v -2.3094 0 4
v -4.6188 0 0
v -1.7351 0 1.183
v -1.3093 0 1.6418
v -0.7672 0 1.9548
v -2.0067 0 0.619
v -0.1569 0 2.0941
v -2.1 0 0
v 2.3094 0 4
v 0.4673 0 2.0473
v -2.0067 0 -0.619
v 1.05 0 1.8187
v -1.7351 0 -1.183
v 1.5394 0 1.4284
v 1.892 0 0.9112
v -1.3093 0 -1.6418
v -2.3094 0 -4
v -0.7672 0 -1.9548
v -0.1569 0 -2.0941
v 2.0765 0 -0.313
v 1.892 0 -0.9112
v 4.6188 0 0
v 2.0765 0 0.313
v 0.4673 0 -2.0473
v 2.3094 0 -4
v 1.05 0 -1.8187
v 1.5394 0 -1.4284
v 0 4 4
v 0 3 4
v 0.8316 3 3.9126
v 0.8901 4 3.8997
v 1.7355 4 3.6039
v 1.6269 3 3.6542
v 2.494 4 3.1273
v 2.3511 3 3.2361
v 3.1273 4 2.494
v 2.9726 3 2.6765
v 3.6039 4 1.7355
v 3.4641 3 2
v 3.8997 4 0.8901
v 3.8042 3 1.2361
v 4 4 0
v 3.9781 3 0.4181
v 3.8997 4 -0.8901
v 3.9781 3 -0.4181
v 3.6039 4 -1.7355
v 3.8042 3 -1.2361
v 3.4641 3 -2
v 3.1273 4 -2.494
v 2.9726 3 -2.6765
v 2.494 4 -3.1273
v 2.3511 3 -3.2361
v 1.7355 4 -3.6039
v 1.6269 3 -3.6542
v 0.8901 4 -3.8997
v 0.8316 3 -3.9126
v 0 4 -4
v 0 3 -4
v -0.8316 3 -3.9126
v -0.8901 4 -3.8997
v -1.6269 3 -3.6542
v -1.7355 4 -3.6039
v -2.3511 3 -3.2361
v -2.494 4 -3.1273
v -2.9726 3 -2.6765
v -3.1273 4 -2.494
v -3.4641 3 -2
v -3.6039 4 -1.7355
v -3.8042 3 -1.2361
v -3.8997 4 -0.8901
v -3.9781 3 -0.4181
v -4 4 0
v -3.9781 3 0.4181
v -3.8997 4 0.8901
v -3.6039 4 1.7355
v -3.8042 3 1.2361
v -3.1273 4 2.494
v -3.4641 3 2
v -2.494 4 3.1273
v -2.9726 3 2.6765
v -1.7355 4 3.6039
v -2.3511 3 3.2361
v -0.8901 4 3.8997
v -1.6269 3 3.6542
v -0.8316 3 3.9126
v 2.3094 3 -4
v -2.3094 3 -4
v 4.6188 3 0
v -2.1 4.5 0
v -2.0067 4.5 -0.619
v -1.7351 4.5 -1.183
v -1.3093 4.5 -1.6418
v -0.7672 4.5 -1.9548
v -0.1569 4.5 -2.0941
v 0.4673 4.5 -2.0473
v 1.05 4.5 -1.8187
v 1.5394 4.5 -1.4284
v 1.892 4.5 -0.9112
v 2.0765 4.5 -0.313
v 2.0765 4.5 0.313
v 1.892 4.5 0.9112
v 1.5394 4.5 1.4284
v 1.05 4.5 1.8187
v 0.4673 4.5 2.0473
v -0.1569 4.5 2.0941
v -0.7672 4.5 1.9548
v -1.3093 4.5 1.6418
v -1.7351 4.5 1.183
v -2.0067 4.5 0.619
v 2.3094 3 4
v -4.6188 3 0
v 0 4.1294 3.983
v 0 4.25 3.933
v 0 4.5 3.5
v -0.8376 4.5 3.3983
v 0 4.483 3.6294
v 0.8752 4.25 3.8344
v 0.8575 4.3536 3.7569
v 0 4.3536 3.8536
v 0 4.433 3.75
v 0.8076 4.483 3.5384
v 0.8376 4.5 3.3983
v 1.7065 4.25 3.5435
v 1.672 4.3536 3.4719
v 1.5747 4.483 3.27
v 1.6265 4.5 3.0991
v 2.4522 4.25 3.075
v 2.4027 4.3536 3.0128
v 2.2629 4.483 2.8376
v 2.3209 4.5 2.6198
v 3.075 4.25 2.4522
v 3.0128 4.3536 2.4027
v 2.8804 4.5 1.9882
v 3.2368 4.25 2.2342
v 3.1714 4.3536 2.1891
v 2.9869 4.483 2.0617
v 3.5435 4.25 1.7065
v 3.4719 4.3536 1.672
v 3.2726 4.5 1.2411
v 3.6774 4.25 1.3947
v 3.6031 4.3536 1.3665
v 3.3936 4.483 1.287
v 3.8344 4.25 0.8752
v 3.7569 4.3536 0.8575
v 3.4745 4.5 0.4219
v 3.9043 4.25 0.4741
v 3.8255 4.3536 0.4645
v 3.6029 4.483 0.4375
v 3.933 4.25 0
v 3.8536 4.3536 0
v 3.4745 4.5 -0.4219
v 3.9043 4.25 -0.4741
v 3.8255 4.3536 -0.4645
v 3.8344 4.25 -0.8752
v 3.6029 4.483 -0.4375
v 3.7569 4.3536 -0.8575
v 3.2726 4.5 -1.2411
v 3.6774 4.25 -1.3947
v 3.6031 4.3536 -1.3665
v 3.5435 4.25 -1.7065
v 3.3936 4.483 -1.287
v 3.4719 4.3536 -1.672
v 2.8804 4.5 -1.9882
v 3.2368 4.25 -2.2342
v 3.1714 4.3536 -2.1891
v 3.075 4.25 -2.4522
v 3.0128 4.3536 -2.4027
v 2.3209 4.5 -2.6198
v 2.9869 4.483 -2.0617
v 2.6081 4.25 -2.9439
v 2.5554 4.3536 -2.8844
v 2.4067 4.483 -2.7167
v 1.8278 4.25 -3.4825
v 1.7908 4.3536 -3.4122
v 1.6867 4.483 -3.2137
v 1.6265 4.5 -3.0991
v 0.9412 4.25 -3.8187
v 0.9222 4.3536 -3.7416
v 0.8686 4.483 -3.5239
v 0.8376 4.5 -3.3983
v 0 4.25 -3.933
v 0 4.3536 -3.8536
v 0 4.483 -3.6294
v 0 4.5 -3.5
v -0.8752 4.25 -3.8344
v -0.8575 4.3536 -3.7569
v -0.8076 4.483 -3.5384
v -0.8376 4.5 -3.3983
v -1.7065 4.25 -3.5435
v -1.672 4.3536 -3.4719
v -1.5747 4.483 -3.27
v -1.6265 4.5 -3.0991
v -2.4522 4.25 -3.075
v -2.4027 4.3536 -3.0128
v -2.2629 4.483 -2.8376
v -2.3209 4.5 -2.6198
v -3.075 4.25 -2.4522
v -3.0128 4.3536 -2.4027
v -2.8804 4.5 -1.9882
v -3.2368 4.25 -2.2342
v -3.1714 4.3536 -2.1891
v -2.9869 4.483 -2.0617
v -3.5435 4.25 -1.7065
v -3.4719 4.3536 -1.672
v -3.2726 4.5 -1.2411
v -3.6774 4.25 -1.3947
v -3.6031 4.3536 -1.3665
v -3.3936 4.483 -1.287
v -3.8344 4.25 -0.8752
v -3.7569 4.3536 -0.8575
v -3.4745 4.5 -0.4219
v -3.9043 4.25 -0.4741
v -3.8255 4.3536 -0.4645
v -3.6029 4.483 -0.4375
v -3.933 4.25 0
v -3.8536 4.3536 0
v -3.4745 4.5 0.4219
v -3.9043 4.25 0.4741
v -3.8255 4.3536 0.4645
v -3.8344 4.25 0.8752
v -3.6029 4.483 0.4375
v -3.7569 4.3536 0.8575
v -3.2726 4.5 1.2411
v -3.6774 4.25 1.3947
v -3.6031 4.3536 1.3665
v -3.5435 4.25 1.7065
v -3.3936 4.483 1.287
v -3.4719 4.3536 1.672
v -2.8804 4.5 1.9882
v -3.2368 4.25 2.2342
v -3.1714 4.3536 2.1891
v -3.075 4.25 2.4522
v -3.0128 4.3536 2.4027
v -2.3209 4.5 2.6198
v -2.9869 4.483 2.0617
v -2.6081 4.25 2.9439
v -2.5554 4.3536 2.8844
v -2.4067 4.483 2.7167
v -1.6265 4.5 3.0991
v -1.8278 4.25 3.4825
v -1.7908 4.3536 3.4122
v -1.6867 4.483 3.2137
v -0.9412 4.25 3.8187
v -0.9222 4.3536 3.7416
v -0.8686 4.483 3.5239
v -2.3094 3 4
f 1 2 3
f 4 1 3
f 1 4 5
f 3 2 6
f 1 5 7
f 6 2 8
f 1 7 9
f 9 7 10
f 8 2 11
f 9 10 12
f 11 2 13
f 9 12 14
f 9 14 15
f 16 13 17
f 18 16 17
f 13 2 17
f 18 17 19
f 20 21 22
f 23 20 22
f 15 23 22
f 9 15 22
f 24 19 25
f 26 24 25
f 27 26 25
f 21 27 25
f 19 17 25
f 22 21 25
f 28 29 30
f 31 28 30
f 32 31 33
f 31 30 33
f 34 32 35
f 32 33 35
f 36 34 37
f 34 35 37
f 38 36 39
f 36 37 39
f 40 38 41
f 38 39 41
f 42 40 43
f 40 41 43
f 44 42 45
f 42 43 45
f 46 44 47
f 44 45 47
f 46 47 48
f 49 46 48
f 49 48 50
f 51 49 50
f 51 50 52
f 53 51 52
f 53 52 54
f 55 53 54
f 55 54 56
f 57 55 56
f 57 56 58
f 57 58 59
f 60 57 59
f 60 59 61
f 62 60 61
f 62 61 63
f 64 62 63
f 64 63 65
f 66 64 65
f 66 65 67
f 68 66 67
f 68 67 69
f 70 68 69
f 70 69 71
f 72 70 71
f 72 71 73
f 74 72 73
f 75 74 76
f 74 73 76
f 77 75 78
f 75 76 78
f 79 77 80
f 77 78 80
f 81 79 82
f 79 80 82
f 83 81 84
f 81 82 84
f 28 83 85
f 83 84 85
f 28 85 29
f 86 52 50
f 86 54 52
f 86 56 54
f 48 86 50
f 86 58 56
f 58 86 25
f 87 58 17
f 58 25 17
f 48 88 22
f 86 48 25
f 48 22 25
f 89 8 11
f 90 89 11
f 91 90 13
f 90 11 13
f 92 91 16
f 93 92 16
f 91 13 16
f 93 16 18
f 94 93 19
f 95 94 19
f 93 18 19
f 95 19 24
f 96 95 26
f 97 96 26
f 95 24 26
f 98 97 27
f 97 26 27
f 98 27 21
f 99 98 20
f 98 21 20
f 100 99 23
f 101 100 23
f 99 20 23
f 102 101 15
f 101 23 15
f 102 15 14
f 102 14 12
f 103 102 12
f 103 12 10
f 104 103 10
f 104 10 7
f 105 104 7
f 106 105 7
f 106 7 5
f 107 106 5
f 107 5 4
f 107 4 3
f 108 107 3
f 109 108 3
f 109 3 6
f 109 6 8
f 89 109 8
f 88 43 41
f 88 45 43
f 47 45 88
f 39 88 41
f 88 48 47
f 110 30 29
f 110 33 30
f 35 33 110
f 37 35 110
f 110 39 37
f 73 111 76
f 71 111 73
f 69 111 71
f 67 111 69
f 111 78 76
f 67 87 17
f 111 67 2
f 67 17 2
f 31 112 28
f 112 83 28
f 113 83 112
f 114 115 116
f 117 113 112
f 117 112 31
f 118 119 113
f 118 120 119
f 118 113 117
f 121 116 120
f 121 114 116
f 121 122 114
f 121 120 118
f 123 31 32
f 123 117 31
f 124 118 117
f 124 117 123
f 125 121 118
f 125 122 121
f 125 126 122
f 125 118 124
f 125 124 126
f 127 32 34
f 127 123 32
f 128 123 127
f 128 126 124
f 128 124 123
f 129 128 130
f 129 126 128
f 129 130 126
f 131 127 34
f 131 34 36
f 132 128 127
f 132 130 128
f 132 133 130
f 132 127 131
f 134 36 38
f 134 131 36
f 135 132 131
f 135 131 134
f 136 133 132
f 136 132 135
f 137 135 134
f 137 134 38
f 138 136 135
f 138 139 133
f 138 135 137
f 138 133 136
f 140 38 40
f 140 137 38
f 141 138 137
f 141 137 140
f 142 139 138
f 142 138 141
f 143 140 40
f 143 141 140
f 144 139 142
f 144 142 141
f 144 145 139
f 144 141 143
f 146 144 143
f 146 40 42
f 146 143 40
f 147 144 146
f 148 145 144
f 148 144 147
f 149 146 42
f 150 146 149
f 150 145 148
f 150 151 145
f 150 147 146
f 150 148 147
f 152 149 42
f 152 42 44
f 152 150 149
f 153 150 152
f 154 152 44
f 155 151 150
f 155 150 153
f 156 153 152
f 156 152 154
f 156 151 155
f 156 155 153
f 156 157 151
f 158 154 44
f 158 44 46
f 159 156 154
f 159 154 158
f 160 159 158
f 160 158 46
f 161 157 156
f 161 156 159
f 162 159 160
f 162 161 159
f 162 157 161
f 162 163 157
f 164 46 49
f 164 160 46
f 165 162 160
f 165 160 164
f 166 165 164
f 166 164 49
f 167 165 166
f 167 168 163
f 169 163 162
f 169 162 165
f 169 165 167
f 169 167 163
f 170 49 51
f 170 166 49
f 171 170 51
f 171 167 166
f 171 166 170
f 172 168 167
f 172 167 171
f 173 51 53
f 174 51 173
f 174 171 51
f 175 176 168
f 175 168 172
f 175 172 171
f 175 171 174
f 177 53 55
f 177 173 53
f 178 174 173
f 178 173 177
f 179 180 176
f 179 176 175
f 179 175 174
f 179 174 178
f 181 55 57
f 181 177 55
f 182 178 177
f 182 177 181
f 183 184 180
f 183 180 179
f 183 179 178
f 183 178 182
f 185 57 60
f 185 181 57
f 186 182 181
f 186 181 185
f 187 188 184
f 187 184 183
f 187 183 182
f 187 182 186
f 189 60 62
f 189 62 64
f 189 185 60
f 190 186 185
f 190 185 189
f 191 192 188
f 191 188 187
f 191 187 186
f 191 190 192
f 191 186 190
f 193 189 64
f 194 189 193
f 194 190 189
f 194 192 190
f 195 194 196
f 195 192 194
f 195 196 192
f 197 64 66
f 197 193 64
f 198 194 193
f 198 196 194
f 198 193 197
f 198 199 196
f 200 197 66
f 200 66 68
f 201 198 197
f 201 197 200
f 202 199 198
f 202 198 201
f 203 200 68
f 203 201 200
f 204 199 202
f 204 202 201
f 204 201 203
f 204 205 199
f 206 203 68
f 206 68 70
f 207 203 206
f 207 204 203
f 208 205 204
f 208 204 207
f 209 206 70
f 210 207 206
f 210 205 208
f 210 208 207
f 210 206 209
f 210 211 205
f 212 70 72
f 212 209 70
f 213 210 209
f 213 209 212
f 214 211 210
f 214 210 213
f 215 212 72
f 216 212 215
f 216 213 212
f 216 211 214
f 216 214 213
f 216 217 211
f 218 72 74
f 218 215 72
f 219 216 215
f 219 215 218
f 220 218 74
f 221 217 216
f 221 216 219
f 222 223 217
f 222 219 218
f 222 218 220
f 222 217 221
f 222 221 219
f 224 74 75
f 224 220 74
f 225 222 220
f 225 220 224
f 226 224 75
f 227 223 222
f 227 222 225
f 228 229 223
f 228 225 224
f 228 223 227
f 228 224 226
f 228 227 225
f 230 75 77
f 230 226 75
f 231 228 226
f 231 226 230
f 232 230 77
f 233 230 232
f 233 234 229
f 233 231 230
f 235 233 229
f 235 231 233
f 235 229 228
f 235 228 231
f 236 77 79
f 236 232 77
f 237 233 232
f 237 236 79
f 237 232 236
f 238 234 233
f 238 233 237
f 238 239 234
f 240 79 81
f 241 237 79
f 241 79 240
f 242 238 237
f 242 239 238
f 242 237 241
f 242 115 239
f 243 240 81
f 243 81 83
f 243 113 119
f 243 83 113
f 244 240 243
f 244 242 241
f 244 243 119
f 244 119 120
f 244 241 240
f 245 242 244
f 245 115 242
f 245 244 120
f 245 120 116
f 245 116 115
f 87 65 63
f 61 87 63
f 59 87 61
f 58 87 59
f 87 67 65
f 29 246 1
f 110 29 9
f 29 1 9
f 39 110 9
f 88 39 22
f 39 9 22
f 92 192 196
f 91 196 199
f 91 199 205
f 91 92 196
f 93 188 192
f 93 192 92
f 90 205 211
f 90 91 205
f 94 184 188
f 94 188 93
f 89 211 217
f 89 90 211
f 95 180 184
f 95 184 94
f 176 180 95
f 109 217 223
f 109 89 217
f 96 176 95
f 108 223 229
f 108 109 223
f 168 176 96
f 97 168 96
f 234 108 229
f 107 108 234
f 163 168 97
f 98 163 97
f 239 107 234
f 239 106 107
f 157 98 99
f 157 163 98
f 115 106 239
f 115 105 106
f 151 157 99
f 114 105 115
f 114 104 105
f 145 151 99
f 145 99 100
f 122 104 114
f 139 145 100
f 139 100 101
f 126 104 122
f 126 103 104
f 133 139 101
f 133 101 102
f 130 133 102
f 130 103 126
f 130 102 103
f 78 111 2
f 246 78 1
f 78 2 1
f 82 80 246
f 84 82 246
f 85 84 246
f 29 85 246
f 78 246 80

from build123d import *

# Parameters (mm, degrees)
BOSS_EXTRUDE1_DEPTH   = 3
SKETCH2_R             = 4
BOSS_EXTRUDE2_DEPTH   = 1.5
M5X0_8_TAPPED_HOLE1_D = 4.2
FILLET1_R             = 0.5


with BuildPart() as part:
    # Sketch1 → Boss-Extrude1 (new body)
    with BuildSketch(Plane(origin=(0, 0, 0), x_dir=(1, 0, 0), z_dir=(0, 1, 0))):
        Polygon((4.618802154, 0), (2.309401077, 4), (-2.309401077, 4), (-4.618802154, 0), (-2.309401077, -4), (2.309401077, -4), align=None)
    extrude(amount=BOSS_EXTRUDE1_DEPTH)

    # Sketch2 → Boss-Extrude2 (add)
    with BuildSketch(Plane(origin=(0, 3, 0), x_dir=(1, 0, 0), z_dir=(0, 1, 0))):
        with Locations(Location((0, 0, 0), (0, 0, 270))):
            Circle(SKETCH2_R)
    extrude(amount=BOSS_EXTRUDE2_DEPTH)

    # M5x0.8 Tapped Hole1 (through all)
    with Locations(Plane(origin=(0, 4.5, 0), x_dir=(1, 0, 0), z_dir=(0, 1, 0))):
        with Locations((0, 0)):
            Hole(M5X0_8_TAPPED_HOLE1_D / 2)

    # Fillet1
    fillet1_edges = [part.edges().sort_by_distance(p)[0] for p in [
        (0, 4.5, -4),
    ]]
    fillet(fillet1_edges, radius=FILLET1_R)


solid = part.part
